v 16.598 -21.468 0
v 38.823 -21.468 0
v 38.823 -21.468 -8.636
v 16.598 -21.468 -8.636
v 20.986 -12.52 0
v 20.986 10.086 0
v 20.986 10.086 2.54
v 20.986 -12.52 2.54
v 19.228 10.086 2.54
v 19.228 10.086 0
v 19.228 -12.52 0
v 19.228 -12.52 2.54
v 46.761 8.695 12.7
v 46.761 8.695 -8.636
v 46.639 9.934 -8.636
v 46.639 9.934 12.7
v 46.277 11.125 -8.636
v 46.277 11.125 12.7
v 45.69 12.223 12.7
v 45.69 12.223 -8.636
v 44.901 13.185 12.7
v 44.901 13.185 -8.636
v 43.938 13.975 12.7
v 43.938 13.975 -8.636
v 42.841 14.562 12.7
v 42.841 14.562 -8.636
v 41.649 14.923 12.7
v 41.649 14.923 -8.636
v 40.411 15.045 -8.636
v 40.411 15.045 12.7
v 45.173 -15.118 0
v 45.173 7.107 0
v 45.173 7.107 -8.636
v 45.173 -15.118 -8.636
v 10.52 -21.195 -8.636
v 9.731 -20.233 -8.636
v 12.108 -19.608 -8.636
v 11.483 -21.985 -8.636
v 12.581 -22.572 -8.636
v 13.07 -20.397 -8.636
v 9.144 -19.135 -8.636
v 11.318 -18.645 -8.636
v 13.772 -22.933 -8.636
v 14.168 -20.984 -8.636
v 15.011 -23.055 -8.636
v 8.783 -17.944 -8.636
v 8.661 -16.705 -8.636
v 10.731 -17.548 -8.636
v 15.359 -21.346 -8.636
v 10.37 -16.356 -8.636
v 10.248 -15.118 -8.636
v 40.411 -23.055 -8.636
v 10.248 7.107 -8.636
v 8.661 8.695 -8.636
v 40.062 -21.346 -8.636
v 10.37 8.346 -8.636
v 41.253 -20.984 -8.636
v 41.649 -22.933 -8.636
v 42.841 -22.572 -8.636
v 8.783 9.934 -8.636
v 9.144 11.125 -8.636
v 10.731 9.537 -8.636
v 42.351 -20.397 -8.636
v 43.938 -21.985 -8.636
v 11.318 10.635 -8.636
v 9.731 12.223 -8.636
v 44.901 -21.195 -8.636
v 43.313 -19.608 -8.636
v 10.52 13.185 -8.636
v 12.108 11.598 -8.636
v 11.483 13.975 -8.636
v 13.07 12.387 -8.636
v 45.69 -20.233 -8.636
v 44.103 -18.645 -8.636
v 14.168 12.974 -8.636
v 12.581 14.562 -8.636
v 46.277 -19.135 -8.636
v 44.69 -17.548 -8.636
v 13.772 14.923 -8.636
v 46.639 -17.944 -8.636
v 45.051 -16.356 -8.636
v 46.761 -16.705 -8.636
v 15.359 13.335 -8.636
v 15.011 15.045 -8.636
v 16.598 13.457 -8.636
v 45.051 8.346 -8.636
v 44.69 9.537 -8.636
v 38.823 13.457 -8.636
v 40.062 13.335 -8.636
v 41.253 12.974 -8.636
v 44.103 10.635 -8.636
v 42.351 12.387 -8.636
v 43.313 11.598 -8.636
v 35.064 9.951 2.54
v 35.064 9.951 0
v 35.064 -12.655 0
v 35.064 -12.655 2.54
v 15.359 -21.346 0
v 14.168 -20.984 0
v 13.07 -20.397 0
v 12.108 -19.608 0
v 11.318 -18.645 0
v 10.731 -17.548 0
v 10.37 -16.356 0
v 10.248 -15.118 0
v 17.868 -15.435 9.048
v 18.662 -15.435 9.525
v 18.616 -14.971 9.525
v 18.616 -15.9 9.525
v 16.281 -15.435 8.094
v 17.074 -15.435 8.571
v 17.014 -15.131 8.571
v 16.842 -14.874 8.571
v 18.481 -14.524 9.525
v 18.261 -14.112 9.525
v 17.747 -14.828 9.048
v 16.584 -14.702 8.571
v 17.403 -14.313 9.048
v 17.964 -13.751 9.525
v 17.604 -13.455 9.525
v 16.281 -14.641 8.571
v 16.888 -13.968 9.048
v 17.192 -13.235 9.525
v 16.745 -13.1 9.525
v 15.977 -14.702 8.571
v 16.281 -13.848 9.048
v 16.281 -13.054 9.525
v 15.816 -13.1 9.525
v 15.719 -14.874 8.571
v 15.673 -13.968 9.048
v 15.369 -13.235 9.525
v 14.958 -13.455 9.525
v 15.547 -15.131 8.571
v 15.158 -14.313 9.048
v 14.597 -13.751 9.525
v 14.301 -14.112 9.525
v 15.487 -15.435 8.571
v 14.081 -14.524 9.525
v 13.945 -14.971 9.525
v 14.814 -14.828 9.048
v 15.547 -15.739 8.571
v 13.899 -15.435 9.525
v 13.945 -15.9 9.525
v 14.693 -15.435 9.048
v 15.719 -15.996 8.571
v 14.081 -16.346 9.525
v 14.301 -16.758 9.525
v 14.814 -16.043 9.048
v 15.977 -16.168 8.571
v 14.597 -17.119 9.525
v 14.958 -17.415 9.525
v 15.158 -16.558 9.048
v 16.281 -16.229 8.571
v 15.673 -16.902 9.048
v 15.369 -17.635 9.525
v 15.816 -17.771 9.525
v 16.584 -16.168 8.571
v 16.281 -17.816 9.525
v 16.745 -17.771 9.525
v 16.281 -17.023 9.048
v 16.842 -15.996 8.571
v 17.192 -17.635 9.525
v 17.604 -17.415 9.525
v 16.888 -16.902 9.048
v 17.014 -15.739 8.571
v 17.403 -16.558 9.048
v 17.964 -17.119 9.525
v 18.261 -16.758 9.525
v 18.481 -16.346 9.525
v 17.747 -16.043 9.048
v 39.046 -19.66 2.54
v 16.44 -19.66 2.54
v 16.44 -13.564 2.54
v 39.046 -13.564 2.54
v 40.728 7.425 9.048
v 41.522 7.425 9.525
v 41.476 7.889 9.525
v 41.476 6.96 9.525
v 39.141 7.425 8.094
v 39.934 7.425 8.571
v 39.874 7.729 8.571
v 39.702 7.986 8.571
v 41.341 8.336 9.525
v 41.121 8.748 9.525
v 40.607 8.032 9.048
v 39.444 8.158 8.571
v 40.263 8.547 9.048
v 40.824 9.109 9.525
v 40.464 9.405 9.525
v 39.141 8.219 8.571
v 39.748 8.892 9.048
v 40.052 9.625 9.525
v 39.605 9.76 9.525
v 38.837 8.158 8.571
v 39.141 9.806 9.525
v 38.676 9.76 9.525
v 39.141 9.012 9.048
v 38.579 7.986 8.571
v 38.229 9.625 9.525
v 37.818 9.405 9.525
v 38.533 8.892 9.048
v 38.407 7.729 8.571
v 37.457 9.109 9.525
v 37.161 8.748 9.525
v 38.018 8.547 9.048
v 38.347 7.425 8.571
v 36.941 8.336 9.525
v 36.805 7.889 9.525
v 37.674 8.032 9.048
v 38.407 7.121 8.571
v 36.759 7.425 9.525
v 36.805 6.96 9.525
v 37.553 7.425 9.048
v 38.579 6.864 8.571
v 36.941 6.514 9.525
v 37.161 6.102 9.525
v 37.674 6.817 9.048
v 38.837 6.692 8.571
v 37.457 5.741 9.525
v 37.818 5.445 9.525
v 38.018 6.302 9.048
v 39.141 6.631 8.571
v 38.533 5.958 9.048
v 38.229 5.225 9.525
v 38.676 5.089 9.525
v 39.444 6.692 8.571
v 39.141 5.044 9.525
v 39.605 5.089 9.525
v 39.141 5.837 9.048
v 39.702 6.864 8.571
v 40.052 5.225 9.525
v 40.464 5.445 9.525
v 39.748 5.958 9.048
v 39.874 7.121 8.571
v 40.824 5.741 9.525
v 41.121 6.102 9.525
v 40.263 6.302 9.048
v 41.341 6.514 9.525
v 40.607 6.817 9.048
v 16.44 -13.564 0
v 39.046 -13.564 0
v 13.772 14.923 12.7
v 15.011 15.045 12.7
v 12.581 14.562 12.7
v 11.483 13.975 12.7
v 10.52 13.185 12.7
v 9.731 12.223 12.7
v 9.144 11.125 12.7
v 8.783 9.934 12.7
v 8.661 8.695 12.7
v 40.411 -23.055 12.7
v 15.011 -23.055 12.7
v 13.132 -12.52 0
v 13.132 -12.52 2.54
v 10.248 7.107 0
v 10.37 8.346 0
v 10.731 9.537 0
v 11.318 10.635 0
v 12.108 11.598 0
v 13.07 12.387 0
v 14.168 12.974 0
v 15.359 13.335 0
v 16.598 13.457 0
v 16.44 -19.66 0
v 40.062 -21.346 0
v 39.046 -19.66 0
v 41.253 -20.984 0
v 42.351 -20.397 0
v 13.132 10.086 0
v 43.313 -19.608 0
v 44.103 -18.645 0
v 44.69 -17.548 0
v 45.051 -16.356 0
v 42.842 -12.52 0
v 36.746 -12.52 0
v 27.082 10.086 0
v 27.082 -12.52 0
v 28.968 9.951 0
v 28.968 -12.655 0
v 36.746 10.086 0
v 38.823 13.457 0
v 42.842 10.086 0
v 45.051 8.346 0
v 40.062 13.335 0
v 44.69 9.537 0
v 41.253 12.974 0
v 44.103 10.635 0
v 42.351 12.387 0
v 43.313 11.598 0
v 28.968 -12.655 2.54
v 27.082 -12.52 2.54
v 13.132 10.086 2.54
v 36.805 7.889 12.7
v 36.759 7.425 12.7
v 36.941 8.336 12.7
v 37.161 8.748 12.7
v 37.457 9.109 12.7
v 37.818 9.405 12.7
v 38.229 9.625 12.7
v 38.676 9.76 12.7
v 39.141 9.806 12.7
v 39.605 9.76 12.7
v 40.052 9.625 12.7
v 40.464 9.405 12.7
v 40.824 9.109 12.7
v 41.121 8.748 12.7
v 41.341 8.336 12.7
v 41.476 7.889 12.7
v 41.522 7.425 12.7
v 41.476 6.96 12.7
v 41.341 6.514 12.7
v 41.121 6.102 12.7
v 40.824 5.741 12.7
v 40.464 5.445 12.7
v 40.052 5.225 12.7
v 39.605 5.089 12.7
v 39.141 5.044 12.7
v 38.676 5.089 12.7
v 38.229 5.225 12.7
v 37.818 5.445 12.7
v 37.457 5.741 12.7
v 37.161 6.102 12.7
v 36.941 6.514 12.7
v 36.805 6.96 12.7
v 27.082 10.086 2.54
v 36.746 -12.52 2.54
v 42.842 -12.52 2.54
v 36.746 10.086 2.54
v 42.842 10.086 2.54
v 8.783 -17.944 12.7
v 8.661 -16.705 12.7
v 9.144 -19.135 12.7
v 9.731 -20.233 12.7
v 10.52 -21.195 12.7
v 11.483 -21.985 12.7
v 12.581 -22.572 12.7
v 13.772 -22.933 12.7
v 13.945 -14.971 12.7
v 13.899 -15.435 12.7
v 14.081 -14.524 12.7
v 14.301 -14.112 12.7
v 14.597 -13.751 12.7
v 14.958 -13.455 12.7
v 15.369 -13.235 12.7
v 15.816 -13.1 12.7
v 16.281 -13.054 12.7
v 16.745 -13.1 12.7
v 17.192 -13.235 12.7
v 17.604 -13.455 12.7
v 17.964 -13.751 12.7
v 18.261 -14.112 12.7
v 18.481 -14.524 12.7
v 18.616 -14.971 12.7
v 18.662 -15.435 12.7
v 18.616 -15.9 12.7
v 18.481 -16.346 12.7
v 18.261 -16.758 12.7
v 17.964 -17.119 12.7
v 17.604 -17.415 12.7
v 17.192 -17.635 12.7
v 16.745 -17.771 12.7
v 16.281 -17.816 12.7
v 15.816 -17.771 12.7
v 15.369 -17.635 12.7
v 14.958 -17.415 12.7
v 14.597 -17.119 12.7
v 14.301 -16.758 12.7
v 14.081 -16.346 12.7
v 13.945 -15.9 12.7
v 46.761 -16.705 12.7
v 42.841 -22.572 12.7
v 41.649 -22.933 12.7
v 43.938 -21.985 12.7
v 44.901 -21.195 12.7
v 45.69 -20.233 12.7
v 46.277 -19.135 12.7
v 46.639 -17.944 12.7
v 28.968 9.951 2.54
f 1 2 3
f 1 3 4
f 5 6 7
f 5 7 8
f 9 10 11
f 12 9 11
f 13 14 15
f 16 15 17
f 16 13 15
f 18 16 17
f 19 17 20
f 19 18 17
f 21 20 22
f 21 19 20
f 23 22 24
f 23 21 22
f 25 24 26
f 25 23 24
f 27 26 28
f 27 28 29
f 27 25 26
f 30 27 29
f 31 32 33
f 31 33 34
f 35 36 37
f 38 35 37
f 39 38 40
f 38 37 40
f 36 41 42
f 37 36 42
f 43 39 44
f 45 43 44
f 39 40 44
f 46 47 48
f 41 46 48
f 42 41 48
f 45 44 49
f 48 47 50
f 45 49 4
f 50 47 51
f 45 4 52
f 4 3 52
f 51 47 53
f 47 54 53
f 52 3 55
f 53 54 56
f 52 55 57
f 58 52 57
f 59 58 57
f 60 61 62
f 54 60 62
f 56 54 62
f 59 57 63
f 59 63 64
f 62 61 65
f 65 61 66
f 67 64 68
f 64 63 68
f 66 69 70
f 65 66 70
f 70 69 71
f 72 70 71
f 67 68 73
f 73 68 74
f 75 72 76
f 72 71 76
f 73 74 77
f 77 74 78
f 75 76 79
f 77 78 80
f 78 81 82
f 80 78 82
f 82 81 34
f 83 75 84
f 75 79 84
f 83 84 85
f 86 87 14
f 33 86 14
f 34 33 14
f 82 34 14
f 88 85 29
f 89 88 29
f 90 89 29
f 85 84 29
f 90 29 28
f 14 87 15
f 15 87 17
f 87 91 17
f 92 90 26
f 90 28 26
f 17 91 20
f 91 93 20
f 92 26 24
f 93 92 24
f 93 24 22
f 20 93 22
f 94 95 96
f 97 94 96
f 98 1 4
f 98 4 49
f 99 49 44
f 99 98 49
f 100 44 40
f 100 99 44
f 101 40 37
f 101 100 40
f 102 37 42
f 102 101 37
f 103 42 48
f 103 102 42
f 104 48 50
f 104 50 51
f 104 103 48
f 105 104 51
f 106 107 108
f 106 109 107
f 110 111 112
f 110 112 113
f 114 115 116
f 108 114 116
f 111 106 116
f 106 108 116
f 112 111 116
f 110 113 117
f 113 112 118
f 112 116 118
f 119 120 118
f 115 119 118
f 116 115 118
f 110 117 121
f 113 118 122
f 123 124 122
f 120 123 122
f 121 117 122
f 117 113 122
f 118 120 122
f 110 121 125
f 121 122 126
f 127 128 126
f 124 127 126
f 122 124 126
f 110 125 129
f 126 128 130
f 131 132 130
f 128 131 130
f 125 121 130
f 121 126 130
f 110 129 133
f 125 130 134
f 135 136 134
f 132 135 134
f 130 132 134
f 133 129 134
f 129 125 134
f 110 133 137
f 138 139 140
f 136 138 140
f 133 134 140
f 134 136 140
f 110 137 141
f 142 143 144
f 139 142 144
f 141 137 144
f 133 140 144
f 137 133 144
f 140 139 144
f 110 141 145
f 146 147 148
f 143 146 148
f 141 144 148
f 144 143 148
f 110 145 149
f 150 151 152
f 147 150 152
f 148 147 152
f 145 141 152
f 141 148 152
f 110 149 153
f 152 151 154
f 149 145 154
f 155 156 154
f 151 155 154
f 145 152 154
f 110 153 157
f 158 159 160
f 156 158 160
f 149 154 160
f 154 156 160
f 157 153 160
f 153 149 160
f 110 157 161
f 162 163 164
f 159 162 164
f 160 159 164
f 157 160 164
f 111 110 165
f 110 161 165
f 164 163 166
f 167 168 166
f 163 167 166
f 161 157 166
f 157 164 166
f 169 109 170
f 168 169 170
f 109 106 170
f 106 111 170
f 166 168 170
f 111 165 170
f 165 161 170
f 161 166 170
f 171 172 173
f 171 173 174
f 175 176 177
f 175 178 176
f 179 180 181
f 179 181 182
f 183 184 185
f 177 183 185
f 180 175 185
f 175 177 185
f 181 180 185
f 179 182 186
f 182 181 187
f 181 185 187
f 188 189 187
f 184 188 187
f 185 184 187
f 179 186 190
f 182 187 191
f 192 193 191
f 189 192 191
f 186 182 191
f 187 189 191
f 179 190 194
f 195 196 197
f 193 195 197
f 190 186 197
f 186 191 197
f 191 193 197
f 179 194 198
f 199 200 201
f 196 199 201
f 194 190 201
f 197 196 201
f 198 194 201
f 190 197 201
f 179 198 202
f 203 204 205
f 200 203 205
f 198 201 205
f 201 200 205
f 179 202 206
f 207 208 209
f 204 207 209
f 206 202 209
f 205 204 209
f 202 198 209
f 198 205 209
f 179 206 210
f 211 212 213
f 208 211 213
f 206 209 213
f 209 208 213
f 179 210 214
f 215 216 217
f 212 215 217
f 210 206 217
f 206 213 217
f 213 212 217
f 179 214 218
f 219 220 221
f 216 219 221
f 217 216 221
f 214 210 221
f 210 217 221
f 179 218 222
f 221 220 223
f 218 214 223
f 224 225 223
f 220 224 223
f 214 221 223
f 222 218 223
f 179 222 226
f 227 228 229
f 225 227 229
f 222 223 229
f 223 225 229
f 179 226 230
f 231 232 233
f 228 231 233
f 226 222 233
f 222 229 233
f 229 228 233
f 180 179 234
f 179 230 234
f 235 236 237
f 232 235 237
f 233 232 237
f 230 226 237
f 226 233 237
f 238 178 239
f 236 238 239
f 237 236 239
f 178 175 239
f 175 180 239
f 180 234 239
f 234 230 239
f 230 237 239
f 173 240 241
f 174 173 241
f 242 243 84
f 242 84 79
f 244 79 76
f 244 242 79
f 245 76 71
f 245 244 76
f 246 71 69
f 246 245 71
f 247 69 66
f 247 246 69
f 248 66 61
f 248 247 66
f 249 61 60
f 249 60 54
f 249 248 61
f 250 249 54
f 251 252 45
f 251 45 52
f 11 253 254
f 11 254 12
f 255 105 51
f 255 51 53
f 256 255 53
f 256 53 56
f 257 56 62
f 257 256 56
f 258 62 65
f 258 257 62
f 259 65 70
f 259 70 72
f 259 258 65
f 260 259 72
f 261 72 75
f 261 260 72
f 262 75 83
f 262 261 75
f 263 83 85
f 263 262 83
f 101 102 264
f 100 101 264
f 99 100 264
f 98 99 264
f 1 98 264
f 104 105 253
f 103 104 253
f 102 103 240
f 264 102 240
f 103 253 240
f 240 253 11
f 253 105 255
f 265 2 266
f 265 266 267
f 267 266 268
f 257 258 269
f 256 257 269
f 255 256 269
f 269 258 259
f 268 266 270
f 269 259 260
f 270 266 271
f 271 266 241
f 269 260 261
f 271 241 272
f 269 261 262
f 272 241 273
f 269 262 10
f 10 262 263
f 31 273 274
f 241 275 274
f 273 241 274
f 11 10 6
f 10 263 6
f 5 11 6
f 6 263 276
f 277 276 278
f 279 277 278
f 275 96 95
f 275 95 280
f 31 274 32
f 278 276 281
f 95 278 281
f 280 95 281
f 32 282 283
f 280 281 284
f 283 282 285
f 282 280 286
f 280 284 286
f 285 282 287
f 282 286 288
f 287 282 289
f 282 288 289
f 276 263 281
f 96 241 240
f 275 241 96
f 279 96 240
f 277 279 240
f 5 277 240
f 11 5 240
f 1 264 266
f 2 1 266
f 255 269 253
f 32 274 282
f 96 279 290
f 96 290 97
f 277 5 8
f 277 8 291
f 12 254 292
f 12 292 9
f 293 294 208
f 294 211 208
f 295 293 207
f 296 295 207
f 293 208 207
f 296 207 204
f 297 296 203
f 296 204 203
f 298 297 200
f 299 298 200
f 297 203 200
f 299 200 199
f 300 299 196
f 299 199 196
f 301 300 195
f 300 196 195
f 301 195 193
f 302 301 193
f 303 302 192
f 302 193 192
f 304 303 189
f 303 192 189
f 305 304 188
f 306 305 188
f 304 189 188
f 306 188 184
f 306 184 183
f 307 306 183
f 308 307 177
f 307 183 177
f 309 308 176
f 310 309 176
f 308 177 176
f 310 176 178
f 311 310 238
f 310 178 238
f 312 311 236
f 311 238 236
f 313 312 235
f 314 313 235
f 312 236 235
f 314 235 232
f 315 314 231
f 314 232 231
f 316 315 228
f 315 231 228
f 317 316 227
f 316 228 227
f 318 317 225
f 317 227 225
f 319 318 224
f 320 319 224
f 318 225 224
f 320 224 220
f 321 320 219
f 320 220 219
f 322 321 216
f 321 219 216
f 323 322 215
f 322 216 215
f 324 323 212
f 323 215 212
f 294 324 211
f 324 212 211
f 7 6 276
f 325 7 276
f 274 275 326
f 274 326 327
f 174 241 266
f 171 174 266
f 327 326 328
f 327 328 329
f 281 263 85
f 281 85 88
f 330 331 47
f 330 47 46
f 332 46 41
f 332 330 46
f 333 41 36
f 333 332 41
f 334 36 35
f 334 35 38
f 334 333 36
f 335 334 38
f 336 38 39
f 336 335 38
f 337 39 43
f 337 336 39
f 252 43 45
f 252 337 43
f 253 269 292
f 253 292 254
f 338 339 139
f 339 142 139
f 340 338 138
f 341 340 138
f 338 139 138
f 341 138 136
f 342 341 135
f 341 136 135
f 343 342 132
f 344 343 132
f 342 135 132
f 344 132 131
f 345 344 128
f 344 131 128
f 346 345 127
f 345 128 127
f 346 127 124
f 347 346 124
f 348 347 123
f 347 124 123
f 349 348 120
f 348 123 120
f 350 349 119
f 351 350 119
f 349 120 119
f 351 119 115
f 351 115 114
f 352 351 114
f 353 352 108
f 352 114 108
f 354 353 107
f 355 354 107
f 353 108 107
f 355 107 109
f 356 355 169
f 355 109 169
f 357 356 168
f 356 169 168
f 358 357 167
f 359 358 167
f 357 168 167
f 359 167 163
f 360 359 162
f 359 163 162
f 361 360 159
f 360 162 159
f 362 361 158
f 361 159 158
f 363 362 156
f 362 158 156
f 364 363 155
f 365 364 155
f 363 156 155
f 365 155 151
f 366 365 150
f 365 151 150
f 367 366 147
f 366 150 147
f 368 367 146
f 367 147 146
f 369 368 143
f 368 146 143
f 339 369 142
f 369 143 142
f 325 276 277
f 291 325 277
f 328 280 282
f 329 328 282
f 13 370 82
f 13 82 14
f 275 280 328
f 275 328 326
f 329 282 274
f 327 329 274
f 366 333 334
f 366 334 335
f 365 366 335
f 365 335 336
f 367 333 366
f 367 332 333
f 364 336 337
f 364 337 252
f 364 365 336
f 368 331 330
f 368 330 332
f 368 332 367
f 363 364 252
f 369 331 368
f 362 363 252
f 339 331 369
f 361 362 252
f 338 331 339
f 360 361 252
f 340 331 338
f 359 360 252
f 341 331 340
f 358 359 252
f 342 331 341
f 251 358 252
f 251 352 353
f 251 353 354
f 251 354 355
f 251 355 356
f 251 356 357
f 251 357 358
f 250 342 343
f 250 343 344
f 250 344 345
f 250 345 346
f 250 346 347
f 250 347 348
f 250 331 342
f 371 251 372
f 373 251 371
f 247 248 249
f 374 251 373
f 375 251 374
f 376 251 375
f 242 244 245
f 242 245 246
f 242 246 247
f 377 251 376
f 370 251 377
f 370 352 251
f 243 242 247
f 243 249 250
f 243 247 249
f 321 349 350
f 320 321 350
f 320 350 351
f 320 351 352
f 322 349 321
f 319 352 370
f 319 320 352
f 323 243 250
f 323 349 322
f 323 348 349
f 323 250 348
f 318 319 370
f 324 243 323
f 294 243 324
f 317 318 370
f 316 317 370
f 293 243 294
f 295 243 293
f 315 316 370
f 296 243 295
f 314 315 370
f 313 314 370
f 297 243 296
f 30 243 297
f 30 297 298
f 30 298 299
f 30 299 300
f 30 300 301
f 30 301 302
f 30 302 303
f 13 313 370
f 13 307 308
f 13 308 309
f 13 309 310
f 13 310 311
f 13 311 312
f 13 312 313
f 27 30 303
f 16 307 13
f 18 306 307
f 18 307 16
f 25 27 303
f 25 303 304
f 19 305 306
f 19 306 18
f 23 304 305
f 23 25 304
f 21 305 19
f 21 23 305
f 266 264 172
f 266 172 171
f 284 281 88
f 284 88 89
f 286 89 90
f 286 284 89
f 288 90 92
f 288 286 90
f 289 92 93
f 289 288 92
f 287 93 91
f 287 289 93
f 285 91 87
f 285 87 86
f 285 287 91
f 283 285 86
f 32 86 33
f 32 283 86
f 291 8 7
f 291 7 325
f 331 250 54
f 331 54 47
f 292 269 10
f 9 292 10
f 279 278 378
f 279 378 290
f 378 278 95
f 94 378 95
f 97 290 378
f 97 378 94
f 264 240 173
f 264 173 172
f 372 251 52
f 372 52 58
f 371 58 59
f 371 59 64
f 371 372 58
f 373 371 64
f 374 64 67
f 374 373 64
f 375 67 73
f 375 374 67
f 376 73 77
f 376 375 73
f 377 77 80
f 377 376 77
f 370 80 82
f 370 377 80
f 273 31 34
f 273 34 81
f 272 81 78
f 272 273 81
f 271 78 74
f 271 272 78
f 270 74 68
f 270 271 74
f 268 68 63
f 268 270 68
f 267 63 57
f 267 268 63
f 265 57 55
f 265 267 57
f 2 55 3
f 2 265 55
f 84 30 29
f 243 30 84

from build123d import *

# Parameters (mm, degrees)
F1_DEPTH = 12.7
F3_DEPTH = 21.336
F6_D     = 4.7625
F6_DEPTH = 3.175
F6_TIP   = 1.4307993491
F7_W     = 6.096
F7_H     = 22.606
F7_W_2   = 22.606
F7_H_2   = 6.096
F8_DEPTH = 2.54
F9_DEPTH = 2.54


with BuildPart() as f1:
    # F0 (on Top) → F1 (new body)
    with BuildSketch(Plane.XY):
        with BuildLine():
            Line((40.4105676174, 15.0449029118), (15.0105676174, 15.0449029118))
            ThreePointArc((15.0105676174, 15.0449029118), (10.5204395569, 13.1850309723), (8.6605676174, 8.6949029118))
            Line((8.6605676174, 8.6949029118), (8.6605676174, -16.7050970882))
            ThreePointArc((8.6605676174, -16.7050970882), (10.5204395569, -21.1952251488), (15.0105676174, -23.0550970882))
            Line((15.0105676174, -23.0550970882), (40.4105676174, -23.0550970882))
            ThreePointArc((40.4105676174, -23.0550970882), (44.900695678, -21.1952251488), (46.7605676174, -16.7050970882))
            Line((46.7605676174, -16.7050970882), (46.7605676174, 8.6949029118))
            ThreePointArc((46.7605676174, 8.6949029118), (44.900695678, 13.1850309723), (40.4105676174, 15.0449029118))
        make_face()
    extrude(amount=F1_DEPTH)

    # F2 (on face) → F3 (join)
    with BuildSketch(Plane.XY.offset(12.7)):
        with BuildLine():
            ThreePointArc((46.7605676174, 8.6949029118), (44.900695678, 13.1850309723), (40.4105676174, 15.0449029118))
            Line((40.4105676174, 15.0449029118), (15.0105676174, 15.0449029118))
            ThreePointArc((15.0105676174, 15.0449029118), (10.5204395569, 13.1850309723), (8.6605676174, 8.6949029118))
            Line((8.6605676174, 8.6949029118), (8.6605676174, -16.7050970882))
            ThreePointArc((8.6605676174, -16.7050970882), (10.5204395569, -21.1952251488), (15.0105676174, -23.0550970882))
            Line((15.0105676174, -23.0550970882), (40.4105676174, -23.0550970882))
            ThreePointArc((40.4105676174, -23.0550970882), (44.900695678, -21.1952251488), (46.7605676174, -16.7050970882))
            Line((46.7605676174, -16.7050970882), (46.7605676174, 8.6949029118))
        make_face()
        with BuildLine():
            ThreePointArc((10.2480676174, 7.1074029118), (12.1079395569, 11.5975309723), (16.5980676174, 13.4574029118))
            Line((16.5980676174, 13.4574029118), (38.8230676174, 13.4574029118))
            ThreePointArc((38.8230676174, 13.4574029118), (43.313195678, 11.5975309723), (45.1730676174, 7.1074029118))
            Line((45.1730676174, 7.1074029118), (45.1730676174, -15.1175970882))
            ThreePointArc((45.1730676174, -15.1175970882), (43.313195678, -19.6077251488), (38.8230676174, -21.4675970882))
            Line((38.8230676174, -21.4675970882), (16.5980676174, -21.4675970882))
            ThreePointArc((16.5980676174, -21.4675970882), (12.1079395569, -19.6077251488), (10.2480676174, -15.1175970882))
            Line((10.2480676174, -15.1175970882), (10.2480676174, 7.1074029118))
        make_face(mode=Mode.SUBTRACT)
    extrude(amount=-F3_DEPTH)

    # F6
    with Locations(Plane.XY.offset(12.7)):
        with Locations((16.2805676174, -15.4350970882), (39.1405676174, 7.4249029118)):
            Hole(F6_D / 2, depth=F6_DEPTH)
            with Locations((0, 0, -(F6_DEPTH + F6_TIP / 2))):  # 118° drill point
                Cone(0, F6_D / 2, F6_TIP, mode=Mode.SUBTRACT)

    # F7 (on face) → F8 (cut)
    with BuildSketch(Plane(origin=(0, 0, 0), x_dir=(1, 0, 0), z_dir=(0, 0, -1))):
        with Locations((16.1795334584, 1.2174902142)):
            Rectangle(F7_W, F7_H)
        with Locations((27.74332076, 16.611794867)):
            Rectangle(F7_W_2, F7_H_2)
        with Locations((24.0339235593, 1.2174902142)):
            Rectangle(F7_W, F7_H)
        with Locations((32.0157772671, 1.3521939175)):
            Rectangle(F7_W, F7_H)
        with Locations((39.7942726691, 1.2174902142)):
            Rectangle(F7_W, F7_H)
    extrude(amount=F8_DEPTH, mode=Mode.SUBTRACT)

    # F7 (on face) → F9 (cut)
    with BuildSketch(Plane(origin=(0, 0, 0), x_dir=(1, 0, 0), z_dir=(0, 0, -1))):
        with Locations((27.74332076, 16.611794867)):
            Rectangle(F7_W_2, F7_H_2)
        with Locations((16.1795334584, 1.2174902142)):
            Rectangle(F7_W, F7_H)
        with Locations((24.0339235593, 1.2174902142)):
            Rectangle(F7_W, F7_H)
        with Locations((32.0157772671, 1.3521939175)):
            Rectangle(F7_W, F7_H)
        with Locations((39.7942726691, 1.2174902142)):
            Rectangle(F7_W, F7_H)
    extrude(amount=-F9_DEPTH, mode=Mode.SUBTRACT)


solid = f1.part
